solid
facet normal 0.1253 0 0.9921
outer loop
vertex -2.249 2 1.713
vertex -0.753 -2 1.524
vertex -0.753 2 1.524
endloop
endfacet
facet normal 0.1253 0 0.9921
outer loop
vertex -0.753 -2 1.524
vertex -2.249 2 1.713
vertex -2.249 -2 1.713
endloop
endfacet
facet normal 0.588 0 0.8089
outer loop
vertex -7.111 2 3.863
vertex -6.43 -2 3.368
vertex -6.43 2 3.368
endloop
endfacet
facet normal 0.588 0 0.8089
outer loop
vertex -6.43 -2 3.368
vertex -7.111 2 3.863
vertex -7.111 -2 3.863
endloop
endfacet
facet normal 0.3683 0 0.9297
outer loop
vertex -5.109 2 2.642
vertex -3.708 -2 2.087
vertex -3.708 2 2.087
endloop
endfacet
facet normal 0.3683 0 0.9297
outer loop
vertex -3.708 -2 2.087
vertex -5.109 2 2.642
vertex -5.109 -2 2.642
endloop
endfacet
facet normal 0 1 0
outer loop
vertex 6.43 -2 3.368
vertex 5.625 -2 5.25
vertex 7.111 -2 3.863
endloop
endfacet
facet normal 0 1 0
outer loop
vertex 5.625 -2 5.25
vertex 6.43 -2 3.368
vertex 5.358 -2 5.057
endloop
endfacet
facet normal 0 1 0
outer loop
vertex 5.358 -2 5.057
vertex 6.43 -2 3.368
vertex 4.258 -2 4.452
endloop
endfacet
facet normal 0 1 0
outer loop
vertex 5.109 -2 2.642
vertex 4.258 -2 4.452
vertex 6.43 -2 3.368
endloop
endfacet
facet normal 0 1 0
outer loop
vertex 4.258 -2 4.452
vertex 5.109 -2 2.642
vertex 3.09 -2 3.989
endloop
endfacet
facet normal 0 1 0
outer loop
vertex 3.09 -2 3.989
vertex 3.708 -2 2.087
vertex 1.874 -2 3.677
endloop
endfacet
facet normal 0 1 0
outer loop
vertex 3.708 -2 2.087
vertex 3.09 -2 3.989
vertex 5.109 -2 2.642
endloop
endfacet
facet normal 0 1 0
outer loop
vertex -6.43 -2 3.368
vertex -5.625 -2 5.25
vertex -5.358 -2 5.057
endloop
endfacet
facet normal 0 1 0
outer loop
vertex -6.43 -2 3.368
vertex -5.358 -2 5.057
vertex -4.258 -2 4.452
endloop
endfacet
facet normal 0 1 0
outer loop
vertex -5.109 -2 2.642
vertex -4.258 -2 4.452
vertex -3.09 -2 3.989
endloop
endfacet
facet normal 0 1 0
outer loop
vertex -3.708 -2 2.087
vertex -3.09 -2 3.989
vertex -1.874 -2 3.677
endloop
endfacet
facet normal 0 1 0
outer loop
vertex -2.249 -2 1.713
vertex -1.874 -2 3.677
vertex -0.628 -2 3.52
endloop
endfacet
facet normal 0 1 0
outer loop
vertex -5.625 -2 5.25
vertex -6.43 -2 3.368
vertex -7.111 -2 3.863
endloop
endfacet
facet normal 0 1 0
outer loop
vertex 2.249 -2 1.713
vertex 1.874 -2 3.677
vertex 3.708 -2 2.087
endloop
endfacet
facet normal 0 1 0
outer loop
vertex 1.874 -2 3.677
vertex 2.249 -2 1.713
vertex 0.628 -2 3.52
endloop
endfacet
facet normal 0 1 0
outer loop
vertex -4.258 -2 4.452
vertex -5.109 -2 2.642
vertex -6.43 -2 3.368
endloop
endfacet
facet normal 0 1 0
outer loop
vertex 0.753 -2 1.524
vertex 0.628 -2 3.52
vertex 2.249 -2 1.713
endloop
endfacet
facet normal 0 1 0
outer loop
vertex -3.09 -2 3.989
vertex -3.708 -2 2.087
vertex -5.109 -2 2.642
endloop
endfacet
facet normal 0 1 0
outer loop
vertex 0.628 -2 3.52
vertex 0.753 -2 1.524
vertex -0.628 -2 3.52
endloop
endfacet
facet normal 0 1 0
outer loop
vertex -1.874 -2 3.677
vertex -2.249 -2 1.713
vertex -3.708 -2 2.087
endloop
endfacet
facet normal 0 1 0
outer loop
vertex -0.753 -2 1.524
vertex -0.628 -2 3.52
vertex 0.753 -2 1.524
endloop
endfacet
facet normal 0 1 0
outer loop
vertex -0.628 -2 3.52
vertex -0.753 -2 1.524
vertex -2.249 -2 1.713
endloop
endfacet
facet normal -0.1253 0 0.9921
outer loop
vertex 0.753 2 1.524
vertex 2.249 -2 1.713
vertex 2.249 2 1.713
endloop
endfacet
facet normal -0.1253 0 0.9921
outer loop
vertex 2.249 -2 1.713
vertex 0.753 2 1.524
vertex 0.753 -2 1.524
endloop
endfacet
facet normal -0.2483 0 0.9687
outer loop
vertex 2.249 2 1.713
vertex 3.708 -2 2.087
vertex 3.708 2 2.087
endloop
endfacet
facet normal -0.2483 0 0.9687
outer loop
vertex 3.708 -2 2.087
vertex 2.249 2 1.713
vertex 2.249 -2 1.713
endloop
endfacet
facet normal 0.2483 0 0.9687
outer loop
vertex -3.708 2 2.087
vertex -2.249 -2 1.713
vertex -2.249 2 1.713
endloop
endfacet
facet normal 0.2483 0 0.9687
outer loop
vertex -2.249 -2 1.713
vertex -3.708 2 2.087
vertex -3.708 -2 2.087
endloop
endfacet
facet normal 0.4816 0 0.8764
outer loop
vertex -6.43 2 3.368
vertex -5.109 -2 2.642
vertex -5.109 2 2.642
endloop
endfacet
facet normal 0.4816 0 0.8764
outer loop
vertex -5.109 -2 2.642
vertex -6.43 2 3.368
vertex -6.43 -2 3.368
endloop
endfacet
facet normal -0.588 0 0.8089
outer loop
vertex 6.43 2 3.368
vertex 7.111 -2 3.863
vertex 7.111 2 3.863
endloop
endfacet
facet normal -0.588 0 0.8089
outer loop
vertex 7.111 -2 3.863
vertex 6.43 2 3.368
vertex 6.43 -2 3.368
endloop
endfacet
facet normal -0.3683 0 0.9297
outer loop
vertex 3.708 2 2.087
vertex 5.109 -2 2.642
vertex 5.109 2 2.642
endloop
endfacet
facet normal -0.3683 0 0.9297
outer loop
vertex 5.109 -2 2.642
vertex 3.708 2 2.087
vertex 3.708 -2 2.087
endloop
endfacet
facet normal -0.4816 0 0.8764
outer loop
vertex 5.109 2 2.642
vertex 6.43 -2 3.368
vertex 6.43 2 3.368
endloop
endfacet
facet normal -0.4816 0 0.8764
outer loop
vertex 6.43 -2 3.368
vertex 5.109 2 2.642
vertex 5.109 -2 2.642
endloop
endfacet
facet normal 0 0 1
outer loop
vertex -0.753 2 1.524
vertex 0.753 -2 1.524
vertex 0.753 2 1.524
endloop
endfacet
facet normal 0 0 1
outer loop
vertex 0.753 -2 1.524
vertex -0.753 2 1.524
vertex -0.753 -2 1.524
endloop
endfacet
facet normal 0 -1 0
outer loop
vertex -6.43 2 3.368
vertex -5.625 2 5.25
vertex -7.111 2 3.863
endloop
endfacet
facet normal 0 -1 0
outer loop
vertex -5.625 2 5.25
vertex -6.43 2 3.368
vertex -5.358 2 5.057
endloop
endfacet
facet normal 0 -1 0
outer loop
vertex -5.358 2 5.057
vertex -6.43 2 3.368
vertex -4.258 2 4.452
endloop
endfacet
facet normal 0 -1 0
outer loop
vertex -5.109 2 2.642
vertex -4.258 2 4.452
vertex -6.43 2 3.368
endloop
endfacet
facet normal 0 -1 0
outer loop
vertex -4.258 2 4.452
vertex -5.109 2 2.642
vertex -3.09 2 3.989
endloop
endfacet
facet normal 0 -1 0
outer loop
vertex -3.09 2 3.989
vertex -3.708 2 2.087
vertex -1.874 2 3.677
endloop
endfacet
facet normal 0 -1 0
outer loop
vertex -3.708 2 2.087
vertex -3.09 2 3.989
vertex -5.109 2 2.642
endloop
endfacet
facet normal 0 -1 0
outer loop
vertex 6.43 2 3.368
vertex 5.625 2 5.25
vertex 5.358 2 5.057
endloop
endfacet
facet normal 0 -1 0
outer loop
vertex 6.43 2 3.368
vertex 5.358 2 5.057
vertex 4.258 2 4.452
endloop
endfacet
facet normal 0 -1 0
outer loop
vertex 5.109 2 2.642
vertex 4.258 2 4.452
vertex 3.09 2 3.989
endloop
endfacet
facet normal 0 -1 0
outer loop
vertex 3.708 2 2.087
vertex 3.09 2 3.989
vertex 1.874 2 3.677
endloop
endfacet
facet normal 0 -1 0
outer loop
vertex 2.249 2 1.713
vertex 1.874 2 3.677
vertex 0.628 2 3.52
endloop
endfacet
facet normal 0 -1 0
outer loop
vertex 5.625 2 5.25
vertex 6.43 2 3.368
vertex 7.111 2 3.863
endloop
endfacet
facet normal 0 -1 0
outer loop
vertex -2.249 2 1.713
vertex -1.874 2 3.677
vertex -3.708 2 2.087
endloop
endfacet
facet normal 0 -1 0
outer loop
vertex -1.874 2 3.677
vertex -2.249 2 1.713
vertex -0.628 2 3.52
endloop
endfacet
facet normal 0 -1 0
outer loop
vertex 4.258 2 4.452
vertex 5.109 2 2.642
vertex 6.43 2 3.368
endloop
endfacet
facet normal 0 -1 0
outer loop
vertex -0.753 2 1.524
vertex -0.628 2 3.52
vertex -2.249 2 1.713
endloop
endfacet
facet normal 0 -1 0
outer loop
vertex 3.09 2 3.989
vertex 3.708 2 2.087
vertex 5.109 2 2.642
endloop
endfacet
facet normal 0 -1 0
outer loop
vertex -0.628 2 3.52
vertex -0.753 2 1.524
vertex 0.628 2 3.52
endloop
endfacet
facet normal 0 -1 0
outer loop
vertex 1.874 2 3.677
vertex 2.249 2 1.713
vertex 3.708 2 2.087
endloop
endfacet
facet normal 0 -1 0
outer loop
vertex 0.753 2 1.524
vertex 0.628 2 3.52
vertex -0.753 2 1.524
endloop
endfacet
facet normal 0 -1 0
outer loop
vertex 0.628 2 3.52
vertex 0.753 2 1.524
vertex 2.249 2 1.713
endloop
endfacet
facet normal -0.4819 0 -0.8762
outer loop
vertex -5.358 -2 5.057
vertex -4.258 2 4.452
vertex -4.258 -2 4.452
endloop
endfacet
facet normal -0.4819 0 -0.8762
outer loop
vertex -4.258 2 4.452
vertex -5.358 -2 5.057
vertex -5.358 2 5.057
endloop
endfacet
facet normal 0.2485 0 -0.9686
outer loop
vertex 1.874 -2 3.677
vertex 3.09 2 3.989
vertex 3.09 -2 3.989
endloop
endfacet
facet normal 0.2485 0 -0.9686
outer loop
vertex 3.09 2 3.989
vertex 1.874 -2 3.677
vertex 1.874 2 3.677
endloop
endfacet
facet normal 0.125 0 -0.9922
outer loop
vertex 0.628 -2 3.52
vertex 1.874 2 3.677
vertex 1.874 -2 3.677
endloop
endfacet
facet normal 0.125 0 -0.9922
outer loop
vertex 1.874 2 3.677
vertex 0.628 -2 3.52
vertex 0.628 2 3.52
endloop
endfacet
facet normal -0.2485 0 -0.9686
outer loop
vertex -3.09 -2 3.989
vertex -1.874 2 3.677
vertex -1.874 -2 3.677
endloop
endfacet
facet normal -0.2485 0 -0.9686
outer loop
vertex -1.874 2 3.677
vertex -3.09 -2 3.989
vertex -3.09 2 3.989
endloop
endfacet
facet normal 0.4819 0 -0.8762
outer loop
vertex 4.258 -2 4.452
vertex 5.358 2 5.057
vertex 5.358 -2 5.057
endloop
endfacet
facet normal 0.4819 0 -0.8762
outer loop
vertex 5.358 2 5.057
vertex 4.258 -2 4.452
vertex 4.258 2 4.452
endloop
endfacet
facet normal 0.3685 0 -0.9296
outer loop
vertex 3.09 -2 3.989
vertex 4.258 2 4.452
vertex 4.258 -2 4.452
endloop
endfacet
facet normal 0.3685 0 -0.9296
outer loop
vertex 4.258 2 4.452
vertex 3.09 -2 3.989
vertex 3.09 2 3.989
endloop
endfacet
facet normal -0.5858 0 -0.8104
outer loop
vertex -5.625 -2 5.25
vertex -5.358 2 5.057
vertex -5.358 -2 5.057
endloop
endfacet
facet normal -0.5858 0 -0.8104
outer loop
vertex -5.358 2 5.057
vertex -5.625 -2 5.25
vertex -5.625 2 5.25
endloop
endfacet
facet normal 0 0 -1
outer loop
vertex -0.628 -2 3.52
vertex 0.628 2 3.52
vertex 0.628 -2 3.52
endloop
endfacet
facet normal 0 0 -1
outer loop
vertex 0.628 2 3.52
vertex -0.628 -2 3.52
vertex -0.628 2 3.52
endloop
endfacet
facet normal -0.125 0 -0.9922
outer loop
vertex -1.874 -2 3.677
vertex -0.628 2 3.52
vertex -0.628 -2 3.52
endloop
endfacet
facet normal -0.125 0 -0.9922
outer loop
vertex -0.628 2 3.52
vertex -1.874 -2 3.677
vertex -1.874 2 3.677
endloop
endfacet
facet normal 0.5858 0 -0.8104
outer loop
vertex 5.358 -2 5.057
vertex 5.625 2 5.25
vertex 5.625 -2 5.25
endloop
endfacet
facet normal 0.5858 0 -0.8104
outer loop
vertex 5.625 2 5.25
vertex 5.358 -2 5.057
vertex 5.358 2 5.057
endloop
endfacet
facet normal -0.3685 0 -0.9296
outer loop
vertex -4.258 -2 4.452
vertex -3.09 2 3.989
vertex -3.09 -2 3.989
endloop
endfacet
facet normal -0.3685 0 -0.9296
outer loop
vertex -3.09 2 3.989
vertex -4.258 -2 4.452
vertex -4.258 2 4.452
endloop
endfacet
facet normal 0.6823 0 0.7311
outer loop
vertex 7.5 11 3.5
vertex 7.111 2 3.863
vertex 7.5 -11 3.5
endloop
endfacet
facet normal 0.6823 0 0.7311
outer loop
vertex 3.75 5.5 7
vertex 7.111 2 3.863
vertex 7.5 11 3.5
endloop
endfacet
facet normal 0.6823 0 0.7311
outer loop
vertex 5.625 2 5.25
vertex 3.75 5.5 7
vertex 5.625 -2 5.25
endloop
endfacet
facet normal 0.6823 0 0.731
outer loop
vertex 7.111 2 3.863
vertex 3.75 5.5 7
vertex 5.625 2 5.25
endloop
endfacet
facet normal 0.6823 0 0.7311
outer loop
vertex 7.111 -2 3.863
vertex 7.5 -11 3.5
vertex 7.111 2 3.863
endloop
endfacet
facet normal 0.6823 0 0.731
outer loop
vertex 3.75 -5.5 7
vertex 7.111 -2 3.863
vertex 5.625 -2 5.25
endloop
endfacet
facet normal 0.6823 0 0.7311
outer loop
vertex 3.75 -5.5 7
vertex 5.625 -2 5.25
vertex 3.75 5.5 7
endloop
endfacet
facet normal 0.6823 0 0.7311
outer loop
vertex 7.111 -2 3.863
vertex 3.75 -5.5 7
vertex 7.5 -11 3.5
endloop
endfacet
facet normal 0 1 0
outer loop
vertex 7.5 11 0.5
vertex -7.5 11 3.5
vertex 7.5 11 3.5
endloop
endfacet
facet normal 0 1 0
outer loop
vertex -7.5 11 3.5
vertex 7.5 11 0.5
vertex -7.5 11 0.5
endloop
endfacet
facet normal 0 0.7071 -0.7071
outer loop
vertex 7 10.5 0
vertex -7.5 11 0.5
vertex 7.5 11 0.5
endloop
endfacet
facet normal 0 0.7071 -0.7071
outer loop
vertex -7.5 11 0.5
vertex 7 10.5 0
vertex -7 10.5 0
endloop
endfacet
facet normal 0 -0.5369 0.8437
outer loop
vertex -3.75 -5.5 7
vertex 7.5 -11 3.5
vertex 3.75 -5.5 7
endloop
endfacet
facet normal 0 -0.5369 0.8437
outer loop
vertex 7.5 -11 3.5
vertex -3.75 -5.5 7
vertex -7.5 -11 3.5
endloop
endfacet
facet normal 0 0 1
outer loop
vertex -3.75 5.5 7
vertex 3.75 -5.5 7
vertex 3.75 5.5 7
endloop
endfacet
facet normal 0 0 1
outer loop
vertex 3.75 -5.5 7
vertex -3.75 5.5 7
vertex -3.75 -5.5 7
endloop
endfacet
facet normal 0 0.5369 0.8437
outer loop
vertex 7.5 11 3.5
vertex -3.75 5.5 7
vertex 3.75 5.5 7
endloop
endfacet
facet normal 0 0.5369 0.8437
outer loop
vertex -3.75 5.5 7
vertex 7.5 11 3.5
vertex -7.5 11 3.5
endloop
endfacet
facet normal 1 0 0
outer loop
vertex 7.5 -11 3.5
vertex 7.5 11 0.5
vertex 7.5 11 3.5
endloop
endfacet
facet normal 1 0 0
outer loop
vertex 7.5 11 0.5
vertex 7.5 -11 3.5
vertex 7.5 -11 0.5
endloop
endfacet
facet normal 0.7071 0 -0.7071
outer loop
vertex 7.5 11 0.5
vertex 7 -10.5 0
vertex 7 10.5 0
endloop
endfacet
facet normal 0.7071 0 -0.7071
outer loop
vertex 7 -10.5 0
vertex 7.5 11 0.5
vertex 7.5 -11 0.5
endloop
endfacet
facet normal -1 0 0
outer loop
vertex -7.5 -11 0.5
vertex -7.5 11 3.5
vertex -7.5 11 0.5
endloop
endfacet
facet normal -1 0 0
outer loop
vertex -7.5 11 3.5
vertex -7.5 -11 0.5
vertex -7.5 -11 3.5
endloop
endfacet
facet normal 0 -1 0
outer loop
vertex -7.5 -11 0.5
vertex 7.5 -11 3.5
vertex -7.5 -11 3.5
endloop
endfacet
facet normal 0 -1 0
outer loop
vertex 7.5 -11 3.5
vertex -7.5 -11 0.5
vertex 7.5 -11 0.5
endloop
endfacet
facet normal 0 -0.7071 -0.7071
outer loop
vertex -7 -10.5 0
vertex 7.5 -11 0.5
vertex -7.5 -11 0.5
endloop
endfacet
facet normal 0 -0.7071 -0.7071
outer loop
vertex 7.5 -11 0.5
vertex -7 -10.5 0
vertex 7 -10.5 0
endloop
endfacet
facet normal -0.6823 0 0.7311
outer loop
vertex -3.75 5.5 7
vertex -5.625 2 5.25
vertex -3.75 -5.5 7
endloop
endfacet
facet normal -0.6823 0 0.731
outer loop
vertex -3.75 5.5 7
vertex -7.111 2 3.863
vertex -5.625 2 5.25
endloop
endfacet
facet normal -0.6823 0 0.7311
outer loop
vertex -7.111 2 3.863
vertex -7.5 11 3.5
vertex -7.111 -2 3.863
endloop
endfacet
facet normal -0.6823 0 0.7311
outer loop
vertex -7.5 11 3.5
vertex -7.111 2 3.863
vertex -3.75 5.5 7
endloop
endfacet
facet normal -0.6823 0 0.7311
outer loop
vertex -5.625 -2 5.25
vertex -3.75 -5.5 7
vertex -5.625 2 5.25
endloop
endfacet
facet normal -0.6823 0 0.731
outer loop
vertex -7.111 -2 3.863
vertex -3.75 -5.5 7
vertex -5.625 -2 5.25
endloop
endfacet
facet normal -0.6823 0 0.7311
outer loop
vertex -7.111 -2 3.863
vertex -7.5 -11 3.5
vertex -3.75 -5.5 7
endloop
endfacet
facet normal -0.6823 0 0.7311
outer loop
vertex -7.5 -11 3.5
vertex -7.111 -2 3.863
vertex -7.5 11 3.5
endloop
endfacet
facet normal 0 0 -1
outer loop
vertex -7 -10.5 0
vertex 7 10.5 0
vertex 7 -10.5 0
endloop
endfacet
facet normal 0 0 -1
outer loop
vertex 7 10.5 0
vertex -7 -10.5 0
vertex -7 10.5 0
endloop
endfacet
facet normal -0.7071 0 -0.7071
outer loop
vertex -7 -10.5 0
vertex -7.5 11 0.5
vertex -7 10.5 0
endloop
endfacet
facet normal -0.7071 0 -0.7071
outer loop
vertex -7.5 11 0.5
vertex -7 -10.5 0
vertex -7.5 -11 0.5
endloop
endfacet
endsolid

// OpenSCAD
anchor_w=15;
anchor_l=22;
bh=3;
difference()
{
    hull()
    {
        translate([0,0,bh/2+.5])cube([anchor_w,anchor_l,bh],center=true);
        translate([0,0,(bh-1)/2])cube([anchor_w-1,anchor_l-1,bh-1],center=true);
        translate([0,0,2+2])cube([anchor_w/2,anchor_l/2,4+2],center=true);
    }
    //annulus
    $fn=50;
    translate([0,0,12+1.5])rotate([90,0,0])difference()
    {
        cylinder(r=12,h=4,center=true);
        cylinder(r=10,h=5,center=true);
    }
}
